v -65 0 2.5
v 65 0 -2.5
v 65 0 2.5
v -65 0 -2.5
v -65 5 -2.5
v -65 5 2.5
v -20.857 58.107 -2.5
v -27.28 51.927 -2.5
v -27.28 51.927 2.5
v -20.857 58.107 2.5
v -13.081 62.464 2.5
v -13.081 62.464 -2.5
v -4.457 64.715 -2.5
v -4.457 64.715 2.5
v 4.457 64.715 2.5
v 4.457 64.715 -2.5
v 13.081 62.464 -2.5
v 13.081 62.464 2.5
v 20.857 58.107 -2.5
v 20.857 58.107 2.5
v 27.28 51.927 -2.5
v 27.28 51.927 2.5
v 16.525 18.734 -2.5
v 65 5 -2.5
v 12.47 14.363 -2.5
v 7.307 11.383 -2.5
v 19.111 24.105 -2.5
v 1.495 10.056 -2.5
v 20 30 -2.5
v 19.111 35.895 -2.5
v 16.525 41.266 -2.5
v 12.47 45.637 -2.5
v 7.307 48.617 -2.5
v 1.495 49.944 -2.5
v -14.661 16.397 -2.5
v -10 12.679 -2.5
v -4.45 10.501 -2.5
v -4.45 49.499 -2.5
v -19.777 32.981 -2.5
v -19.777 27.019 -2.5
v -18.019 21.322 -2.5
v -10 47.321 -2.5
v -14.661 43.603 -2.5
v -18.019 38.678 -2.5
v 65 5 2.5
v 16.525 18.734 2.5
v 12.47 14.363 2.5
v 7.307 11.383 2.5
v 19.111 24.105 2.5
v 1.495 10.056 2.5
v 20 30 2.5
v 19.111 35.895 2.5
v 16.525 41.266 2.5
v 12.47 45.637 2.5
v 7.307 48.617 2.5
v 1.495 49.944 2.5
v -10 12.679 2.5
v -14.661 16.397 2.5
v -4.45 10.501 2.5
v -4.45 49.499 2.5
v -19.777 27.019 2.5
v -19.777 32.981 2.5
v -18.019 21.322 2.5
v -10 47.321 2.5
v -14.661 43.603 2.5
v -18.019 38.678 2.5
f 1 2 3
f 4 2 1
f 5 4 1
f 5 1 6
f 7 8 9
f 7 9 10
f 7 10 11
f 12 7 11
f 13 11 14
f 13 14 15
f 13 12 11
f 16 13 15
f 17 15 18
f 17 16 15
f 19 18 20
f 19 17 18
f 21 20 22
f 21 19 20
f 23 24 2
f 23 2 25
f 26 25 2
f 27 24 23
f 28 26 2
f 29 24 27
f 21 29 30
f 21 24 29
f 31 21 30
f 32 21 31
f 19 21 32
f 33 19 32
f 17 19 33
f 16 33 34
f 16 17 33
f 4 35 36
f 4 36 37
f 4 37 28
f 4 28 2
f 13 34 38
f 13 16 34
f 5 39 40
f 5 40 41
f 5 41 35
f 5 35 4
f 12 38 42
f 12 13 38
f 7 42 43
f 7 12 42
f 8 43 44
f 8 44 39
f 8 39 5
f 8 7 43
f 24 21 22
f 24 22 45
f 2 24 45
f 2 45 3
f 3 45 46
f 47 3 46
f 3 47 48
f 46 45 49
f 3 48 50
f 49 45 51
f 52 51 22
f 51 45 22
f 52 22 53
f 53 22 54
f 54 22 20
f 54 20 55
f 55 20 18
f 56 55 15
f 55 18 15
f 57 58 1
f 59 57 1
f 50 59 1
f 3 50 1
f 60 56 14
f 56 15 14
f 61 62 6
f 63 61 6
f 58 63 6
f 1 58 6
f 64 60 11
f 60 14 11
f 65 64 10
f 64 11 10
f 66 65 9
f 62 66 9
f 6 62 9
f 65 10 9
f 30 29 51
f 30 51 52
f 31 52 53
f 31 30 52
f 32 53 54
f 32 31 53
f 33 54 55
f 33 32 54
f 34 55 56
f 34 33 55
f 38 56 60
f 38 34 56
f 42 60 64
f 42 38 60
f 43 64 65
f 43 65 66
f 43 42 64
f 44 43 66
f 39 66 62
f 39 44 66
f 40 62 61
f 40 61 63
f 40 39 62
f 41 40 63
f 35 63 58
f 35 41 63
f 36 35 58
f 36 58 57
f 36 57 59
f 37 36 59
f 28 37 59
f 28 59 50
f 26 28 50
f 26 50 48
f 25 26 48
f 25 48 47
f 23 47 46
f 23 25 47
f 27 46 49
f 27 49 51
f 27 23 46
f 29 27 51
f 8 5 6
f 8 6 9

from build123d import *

# Parameters (mm, degrees)
EXTRUDE_1_DEPTH      = 2.5
EXTRUDE_1_DEPTH_BACK = 2.5
SKETCH_1_R           = 20


with BuildPart() as part:
    # Эскиз1 → Бобышка-Вытянуть1 (new, two sides: drawn at the far end of the back side and taken through both)
    with BuildSketch(Plane.XY.offset(-EXTRUDE_1_DEPTH_BACK)):
        with BuildLine():
            Line((-65, 5), (-27.279788924, 51.927451203))
            ThreePointArc((-27.279788924, 51.927451203), (0, 65), (27.279788924, 51.927451203))
            Line((27.279788924, 51.927451203), (65, 5))
            Line((65, 5), (65, 0))
            Line((65, 0), (-65, 0))
            Line((-65, 0), (-65, 5))
        make_face()
        with Locations((0, 30)):
            Circle(SKETCH_1_R, mode=Mode.SUBTRACT)
    extrude(amount=EXTRUDE_1_DEPTH + EXTRUDE_1_DEPTH_BACK)


solid = part.part
